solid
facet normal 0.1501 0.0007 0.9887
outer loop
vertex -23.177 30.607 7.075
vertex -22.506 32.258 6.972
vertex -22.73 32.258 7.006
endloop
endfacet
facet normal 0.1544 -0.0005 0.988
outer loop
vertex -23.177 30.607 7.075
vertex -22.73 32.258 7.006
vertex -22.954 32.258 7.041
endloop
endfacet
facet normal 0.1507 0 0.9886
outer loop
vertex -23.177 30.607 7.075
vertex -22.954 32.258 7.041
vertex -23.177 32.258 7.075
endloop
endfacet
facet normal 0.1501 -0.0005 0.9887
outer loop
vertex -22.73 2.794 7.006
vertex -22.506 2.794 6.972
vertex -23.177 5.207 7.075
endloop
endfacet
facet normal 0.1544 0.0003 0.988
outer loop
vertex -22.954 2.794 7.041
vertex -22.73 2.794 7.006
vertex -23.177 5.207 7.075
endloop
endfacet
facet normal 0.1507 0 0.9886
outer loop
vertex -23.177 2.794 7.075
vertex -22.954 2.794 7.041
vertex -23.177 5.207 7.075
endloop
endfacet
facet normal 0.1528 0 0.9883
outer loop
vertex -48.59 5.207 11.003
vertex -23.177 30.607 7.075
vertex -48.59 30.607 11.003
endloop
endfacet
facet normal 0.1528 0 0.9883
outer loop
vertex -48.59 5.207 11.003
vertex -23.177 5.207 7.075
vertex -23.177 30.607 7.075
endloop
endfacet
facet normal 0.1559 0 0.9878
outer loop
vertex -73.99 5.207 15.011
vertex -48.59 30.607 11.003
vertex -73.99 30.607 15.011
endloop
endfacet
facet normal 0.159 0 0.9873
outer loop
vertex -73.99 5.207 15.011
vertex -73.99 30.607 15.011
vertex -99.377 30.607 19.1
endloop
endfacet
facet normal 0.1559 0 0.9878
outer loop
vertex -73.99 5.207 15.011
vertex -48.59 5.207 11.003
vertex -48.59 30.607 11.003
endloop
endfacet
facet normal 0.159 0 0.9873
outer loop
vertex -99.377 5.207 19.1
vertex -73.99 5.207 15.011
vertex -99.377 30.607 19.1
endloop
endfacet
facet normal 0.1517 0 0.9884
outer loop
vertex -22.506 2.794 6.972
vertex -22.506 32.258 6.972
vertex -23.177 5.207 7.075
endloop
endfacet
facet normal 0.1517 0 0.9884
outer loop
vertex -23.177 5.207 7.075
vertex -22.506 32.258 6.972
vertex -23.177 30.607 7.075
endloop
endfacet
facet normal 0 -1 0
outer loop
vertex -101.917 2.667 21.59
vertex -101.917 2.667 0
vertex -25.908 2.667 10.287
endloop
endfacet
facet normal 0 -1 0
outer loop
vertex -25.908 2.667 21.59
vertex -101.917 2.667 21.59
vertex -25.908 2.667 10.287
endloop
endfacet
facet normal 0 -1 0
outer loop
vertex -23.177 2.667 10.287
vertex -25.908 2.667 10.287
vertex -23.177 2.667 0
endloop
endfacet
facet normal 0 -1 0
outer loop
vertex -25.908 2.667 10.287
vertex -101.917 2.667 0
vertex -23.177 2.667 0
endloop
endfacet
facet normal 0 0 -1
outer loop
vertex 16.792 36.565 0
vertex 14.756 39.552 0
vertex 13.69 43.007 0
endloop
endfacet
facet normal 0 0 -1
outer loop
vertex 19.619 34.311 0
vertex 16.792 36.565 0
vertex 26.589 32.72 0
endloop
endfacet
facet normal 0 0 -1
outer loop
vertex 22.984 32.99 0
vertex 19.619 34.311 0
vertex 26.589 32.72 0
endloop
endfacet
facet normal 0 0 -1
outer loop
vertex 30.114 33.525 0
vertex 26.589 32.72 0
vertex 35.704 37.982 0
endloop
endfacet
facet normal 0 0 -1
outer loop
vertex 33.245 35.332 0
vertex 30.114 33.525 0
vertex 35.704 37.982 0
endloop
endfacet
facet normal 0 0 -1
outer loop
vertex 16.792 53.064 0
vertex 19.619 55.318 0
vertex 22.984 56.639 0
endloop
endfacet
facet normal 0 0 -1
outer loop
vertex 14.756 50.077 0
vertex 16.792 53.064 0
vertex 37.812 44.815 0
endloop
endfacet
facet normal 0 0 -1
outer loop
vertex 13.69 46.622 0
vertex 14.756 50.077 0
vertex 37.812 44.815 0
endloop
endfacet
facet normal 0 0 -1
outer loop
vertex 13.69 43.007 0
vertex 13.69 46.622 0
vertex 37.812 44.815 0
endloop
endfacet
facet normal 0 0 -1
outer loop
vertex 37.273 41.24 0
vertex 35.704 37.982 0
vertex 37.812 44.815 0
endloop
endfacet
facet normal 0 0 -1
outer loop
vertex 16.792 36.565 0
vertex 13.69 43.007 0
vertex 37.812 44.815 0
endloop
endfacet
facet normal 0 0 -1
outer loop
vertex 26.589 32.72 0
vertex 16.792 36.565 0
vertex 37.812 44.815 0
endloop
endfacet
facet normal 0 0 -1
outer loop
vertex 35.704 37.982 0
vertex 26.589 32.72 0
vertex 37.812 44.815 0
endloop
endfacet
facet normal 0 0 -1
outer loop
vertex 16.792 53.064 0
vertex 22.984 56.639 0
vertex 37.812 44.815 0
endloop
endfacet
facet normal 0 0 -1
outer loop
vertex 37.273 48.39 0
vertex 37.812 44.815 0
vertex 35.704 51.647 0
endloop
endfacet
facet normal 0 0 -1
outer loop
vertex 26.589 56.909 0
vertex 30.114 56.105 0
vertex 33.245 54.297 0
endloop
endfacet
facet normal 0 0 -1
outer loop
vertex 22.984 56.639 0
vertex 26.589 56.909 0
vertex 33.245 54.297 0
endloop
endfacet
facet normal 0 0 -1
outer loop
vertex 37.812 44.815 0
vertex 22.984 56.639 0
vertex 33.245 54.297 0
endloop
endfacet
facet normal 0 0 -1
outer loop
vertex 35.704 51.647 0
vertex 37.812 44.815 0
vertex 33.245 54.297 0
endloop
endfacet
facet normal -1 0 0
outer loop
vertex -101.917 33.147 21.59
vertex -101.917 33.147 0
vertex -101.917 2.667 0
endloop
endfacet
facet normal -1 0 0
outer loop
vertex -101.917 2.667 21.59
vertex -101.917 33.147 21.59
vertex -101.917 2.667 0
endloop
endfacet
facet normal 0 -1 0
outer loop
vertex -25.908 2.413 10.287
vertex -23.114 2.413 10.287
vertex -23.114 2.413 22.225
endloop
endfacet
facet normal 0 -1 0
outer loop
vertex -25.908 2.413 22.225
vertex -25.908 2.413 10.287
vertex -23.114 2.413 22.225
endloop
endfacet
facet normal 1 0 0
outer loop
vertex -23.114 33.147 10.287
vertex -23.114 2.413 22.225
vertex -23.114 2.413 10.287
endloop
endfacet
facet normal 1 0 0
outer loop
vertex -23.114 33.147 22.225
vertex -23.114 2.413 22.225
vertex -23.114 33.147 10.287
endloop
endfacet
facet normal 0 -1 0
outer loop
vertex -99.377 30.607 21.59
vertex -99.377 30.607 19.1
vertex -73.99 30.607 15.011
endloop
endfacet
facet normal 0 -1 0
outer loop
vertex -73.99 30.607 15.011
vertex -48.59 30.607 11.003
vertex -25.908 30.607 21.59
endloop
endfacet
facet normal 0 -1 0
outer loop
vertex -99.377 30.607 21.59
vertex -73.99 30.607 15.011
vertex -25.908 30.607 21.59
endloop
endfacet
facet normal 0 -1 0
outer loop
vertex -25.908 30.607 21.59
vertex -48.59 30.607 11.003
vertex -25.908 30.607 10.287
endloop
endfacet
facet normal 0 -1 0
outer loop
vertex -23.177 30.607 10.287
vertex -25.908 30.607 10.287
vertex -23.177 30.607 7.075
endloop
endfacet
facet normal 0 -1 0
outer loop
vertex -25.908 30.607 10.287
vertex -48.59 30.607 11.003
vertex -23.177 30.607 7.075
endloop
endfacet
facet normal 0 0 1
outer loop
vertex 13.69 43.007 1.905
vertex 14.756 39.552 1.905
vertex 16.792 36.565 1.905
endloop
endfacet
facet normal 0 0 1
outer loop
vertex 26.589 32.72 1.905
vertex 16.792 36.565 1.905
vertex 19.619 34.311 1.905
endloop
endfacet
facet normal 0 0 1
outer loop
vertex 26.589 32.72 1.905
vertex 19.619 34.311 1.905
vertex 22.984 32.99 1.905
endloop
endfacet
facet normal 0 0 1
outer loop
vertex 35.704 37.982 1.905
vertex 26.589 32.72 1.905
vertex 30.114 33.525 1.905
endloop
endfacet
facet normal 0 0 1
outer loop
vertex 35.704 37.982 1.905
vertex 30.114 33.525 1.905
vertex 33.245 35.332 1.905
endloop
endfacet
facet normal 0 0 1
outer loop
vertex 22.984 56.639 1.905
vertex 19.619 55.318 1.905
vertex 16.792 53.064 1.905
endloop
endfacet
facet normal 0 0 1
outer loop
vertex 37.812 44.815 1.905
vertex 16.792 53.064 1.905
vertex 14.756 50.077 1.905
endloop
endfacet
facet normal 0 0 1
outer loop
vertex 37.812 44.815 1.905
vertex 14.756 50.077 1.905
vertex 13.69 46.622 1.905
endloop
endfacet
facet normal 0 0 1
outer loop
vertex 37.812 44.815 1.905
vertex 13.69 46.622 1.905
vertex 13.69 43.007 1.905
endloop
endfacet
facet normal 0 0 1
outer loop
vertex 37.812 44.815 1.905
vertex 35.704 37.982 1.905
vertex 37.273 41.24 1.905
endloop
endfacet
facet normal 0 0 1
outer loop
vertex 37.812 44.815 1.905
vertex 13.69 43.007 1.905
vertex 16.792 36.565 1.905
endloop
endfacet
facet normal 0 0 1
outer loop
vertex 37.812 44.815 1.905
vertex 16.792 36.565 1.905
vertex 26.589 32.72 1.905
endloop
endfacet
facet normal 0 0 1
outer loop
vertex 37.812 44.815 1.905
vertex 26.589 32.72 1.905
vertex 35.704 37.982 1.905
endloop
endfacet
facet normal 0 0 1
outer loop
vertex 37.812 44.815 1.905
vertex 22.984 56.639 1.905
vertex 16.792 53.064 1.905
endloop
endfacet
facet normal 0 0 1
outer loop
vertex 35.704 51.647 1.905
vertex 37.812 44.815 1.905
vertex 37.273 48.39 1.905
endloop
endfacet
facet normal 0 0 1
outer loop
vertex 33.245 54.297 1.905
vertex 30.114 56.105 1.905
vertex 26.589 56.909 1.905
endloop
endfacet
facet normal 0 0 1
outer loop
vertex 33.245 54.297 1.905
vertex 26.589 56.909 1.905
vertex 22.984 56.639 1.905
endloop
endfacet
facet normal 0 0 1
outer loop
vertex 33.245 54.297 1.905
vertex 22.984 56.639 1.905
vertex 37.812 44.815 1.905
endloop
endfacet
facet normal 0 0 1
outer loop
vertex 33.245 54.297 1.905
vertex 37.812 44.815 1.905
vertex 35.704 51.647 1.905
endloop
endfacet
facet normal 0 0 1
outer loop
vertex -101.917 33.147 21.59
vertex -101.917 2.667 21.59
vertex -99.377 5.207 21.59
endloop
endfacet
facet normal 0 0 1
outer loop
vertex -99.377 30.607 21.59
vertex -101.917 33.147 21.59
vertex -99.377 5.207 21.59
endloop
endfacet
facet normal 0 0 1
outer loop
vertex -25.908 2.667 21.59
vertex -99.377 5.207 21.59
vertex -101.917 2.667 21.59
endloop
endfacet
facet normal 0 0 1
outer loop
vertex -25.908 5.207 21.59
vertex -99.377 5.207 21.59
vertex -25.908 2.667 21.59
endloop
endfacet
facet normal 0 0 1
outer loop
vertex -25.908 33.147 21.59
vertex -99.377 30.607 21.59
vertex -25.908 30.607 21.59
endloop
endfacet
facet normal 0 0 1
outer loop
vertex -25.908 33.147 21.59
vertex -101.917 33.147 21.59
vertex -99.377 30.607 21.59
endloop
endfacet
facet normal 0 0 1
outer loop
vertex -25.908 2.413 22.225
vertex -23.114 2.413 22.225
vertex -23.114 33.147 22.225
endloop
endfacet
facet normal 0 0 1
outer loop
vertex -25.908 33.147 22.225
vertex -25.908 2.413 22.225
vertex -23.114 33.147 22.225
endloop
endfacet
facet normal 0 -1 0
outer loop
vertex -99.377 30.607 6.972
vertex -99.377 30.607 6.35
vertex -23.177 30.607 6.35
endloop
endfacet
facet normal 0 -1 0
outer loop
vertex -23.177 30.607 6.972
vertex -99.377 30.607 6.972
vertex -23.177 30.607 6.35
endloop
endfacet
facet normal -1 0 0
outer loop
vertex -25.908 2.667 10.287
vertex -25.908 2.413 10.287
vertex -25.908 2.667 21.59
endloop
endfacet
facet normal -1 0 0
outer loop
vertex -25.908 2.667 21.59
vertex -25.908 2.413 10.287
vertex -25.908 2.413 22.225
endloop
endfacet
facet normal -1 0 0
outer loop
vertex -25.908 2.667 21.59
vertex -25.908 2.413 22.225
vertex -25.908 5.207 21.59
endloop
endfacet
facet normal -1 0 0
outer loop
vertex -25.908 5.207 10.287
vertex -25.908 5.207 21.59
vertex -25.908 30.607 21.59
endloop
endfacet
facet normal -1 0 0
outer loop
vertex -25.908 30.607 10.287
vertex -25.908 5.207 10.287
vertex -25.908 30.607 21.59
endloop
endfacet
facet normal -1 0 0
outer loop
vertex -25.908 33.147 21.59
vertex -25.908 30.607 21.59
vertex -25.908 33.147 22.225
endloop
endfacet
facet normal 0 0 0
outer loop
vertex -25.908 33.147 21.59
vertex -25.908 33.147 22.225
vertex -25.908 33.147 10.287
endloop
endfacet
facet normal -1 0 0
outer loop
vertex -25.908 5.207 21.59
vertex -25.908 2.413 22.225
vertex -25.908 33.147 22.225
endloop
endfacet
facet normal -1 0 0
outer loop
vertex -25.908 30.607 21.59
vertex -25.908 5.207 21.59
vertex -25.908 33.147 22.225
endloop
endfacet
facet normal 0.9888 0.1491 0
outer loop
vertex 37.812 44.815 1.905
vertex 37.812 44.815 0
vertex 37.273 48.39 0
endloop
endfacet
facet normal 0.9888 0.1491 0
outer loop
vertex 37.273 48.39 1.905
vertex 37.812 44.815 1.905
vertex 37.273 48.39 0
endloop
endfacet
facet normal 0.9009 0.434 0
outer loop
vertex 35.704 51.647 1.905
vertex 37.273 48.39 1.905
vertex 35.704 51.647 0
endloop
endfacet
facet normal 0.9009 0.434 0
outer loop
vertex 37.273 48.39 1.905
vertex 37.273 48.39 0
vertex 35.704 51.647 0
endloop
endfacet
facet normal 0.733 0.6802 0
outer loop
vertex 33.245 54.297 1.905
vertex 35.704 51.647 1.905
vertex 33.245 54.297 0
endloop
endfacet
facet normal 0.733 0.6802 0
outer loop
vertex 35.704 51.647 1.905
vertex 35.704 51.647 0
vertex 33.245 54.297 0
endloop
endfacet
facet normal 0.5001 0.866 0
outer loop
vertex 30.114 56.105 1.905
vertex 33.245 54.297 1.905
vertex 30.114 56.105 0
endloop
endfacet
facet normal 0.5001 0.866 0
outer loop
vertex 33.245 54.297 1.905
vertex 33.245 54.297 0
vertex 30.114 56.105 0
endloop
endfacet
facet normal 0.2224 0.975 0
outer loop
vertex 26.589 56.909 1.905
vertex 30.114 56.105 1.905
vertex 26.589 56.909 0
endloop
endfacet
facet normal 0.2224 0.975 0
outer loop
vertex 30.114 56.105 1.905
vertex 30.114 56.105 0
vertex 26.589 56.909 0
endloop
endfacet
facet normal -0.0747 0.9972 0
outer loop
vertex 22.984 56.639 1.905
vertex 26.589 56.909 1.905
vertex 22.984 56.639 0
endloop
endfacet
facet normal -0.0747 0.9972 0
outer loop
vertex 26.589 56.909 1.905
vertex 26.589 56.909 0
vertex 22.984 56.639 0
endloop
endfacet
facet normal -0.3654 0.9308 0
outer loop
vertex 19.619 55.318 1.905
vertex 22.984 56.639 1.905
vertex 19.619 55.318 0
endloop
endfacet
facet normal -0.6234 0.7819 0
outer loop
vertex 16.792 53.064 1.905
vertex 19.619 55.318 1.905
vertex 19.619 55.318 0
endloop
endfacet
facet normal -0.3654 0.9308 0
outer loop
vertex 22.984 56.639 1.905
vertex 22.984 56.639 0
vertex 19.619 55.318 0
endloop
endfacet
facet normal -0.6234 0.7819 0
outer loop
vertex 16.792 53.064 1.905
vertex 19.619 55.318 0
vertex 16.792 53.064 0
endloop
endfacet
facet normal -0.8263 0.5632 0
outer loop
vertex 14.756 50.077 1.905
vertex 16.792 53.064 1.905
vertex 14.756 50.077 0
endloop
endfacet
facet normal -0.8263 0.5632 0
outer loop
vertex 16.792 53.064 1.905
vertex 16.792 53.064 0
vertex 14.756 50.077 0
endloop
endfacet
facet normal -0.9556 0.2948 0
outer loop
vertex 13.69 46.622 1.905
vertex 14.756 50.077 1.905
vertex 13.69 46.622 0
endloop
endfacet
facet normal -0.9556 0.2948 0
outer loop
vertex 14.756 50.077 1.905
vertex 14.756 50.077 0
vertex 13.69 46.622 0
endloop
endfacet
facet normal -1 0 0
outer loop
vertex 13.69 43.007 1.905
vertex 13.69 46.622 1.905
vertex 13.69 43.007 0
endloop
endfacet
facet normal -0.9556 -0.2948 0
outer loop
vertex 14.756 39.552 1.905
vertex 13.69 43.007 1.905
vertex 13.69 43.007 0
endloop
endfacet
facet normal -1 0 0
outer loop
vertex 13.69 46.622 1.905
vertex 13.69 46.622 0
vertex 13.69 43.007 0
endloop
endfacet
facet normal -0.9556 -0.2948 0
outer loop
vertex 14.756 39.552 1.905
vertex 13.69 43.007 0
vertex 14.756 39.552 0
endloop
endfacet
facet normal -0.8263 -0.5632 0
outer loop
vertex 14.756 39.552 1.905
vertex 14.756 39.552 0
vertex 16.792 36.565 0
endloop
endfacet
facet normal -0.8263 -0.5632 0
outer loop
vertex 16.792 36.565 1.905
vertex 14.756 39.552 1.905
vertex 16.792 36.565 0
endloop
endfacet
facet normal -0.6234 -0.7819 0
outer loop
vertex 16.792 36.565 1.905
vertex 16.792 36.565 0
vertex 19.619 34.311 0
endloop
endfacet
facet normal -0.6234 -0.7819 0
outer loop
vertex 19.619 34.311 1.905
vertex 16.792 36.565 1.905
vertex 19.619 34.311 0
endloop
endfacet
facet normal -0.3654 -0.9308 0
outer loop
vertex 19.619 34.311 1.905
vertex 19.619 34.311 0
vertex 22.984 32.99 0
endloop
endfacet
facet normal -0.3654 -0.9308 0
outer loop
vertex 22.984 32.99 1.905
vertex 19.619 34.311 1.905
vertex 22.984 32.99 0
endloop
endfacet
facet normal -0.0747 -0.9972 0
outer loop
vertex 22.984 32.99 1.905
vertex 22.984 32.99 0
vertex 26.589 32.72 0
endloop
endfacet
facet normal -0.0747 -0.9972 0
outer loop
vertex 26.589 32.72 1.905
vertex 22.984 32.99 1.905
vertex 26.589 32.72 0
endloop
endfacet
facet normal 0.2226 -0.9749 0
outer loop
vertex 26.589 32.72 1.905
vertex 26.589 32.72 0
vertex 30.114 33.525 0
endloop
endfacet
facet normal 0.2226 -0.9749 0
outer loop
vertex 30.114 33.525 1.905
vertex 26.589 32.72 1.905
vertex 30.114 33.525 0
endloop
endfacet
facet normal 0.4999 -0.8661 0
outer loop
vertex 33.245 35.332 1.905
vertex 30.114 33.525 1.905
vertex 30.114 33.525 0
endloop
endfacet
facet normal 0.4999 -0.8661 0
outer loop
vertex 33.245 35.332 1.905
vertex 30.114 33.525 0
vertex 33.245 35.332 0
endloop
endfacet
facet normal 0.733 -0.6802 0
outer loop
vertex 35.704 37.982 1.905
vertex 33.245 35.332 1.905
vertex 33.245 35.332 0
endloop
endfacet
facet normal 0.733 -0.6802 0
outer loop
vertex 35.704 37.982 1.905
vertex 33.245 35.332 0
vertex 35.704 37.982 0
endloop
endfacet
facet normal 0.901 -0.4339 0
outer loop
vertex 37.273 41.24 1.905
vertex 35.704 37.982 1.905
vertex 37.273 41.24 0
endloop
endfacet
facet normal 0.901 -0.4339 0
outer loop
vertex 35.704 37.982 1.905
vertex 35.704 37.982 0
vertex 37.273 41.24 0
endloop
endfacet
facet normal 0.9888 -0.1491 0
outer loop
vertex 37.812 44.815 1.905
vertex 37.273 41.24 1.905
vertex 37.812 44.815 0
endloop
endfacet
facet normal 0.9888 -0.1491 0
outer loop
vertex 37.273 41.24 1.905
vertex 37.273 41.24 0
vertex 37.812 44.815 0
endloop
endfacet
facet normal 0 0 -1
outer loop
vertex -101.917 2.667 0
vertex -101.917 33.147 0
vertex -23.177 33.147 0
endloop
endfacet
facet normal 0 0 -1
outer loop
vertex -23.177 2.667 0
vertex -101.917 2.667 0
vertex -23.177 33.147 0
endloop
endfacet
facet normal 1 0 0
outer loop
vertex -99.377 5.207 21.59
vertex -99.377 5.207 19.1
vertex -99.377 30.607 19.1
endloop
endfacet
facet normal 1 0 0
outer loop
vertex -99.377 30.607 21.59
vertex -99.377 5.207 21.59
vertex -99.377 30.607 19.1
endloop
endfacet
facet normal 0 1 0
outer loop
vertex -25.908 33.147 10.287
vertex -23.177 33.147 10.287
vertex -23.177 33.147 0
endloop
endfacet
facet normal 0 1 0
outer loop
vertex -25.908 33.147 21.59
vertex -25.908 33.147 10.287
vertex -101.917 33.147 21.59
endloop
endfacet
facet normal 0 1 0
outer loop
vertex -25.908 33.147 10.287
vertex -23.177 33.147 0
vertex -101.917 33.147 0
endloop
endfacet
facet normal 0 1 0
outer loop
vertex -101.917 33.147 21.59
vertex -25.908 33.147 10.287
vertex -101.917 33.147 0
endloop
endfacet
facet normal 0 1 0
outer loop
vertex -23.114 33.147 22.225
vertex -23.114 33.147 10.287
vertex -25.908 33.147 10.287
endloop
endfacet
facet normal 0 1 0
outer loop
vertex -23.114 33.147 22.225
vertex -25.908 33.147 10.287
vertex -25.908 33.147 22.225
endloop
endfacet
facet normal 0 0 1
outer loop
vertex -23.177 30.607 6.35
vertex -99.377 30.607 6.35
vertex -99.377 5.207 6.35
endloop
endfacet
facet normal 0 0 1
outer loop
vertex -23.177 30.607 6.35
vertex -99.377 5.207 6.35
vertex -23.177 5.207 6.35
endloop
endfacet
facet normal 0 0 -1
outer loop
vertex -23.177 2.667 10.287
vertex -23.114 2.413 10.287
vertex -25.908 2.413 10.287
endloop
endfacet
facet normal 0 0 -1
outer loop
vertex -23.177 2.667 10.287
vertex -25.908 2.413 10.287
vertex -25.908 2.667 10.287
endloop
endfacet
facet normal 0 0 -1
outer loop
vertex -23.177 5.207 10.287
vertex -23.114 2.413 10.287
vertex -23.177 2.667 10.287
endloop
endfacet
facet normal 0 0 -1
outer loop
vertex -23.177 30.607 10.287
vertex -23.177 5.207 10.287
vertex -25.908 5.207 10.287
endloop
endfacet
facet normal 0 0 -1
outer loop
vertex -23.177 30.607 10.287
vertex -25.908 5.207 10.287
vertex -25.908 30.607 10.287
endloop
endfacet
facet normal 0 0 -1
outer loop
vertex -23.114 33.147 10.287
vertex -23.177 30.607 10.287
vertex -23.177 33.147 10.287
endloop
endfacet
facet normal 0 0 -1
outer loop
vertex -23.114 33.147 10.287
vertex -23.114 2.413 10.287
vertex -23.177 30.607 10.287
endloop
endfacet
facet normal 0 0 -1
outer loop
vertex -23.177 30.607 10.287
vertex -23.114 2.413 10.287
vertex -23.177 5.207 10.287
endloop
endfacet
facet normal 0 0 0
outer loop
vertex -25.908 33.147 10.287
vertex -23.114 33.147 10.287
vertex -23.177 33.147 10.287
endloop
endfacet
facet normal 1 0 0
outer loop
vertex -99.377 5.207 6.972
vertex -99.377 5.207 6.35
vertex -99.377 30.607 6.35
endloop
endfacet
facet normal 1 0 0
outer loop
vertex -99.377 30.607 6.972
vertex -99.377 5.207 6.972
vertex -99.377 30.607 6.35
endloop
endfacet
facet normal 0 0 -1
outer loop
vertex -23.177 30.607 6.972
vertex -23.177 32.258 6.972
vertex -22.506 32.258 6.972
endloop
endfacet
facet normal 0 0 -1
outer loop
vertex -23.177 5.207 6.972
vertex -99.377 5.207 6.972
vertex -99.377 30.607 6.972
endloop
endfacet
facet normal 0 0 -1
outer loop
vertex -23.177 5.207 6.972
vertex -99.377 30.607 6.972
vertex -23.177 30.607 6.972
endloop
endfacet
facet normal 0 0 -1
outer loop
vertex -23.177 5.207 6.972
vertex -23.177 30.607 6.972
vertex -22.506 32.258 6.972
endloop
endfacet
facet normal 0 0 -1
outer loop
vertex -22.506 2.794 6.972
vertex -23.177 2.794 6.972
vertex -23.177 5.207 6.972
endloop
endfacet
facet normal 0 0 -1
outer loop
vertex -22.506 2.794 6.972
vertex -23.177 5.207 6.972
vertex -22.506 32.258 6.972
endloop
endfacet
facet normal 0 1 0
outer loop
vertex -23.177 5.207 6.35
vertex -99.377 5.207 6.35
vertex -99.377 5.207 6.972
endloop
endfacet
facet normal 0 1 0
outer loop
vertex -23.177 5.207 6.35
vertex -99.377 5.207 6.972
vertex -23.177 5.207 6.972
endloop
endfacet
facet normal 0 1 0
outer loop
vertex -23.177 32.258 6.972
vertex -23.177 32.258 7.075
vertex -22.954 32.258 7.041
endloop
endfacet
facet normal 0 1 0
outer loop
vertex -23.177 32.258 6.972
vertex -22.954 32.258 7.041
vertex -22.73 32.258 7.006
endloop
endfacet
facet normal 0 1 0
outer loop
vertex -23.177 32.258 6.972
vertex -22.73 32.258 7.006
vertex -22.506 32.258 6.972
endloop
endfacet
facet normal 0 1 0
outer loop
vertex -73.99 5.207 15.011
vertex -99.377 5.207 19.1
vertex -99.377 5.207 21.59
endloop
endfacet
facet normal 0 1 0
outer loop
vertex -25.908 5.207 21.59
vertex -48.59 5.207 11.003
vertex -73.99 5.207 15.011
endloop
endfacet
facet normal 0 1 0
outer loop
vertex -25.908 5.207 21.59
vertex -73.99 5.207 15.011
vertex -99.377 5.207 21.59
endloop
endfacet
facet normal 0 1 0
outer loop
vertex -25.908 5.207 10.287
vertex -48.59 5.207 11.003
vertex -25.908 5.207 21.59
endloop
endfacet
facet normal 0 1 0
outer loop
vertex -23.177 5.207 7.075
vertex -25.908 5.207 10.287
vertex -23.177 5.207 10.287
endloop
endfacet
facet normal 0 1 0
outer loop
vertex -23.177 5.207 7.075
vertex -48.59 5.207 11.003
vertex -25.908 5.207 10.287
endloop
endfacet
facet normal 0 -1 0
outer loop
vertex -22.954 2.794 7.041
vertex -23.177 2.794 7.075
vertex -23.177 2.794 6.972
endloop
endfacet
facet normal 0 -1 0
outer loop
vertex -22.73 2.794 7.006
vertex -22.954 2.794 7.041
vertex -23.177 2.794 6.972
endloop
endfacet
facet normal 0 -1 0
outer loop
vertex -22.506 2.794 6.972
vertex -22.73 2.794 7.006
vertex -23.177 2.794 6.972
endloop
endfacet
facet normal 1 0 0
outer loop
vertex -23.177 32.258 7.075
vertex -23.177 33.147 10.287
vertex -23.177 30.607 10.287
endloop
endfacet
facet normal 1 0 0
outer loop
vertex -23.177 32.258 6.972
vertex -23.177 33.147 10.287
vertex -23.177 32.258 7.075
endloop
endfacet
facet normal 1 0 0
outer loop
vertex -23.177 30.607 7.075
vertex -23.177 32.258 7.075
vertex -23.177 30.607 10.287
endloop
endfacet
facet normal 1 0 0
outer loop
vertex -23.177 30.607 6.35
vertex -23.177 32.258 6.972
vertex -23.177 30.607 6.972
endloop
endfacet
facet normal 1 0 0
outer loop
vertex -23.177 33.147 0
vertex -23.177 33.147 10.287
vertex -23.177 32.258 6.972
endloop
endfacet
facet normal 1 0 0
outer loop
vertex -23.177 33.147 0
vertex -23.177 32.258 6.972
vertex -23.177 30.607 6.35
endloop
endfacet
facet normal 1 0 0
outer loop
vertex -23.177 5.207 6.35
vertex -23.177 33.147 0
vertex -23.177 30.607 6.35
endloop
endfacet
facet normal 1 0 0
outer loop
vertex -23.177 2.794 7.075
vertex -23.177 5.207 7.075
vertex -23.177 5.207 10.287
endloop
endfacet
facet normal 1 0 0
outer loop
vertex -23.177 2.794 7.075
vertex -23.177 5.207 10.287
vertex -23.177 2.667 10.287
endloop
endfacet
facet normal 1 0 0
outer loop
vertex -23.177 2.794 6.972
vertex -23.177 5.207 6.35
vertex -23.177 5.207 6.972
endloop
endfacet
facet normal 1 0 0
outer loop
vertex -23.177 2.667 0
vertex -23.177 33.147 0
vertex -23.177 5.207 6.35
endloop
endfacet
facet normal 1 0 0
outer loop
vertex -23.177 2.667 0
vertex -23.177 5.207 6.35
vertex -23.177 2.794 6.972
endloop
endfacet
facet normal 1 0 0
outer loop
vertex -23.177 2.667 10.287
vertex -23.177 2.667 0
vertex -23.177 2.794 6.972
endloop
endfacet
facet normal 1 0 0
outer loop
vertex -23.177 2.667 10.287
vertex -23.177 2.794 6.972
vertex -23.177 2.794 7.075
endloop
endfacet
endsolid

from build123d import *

# Parameters (mm, degrees)
F0_W      = 76.2
F0_H      = 25.4
F1_DEPTH  = 6.35
F0_H_2    = 2.5399950532
F0_H_3    = 2.5400049468
F2_DEPTH  = 19.05
F4_DEPTH  = 32.258
F5_DEPTH  = 2.794
F6_DEPTH  = 21.59
F8_START  = -23.114
F7_W      = 30.7340035215
F7_H      = 13.7160019949
F8_DEPTH  = 2.794
F9_R      = 12.1285
F10_DEPTH = 1.905
F11_DEPTH = 1.778


with BuildPart() as f1:
    # F0 (on Top) → F1 (new body)
    with BuildSketch(Plane.XY):
        with Locations((-61.2774978137, 17.9070052312)):
            Rectangle(F0_W, F0_H)
    extrude(amount=F1_DEPTH)



with BuildPart() as f2:
    # F0 (on Top) → F2 (new body)
    with BuildSketch(Plane.XY):
        with Locations((-61.2774978137, 31.8770027578)):
            Rectangle(F0_W, F0_H_2)
        with Locations((-61.2774978137, 3.9370027578)):
            Rectangle(F0_W, F0_H_3)
        Polygon((-99.3774978137, 5.2070052312), (-99.3774978137, 30.6070052312), (-99.3774978137, 33.1470002844), (-101.9174978137, 33.1470002844), (-101.9174978137, 2.6670002844), (-99.3774978137, 2.6670002844), align=None)
    extrude(amount=F2_DEPTH)

    # F3 (on Front) → F4 (join)
    with BuildSketch(Plane.XZ):
        with BuildLine():
            ThreePointArc((-22.5064698607, 6.9721243344), (-61.1948049528, 12.9814471102), (-99.8537540436, 19.1770009696))
            Line((-99.8537540436, 19.1770009696), (-99.8537540436, 6.9721243344))
            Line((-99.8537540436, 6.9721243344), (-22.5064698607, 6.9721243344))
        make_face()
    extrude(amount=-F4_DEPTH)

    # F5 (cut): a face of the model
    f5_faces = [f2.faces().sort_by_distance(p)[0] for p in [
        (-74.2070811501, 0, 11.0193779439),
    ]]
    extrude(f5_faces, amount=-F5_DEPTH, mode=Mode.SUBTRACT)


with BuildPart() as f1_1:
    add(f1.part)

    add(f2.part)  # F6 merges F2
    # F0 (on Top) → F6 (join)
    with BuildSketch(Plane.XY):
        with Locations((-61.2774978137, 3.9370027578)):
            Rectangle(F0_W, F0_H_3)
        Polygon((-99.3774978137, 5.2070052312), (-99.3774978137, 30.6070052312), (-99.3774978137, 33.1470002844), (-101.9174978137, 33.1470002844), (-101.9174978137, 2.6670002844), (-99.3774978137, 2.6670002844), align=None)
        with Locations((-61.2774978137, 31.8770027578)):
            Rectangle(F0_W, F0_H_2)
    extrude(amount=F6_DEPTH)

    # F7 (on Right) → F8 (join)
    with BuildSketch(Plane.YZ.offset(F8_START)):
        with Locations((17.7800017409, 15.3670008294)):
            Rectangle(F7_W, F7_H)
    extrude(amount=-F8_DEPTH)

    # F11 (cut): a face of the model
    f11_faces = [f1_1.faces().sort_by_distance(p)[0] for p in [
        (-24.5048834941, 17.7555399207, 8.508999832),
    ]]
    extrude(f11_faces, amount=-F11_DEPTH, mode=Mode.SUBTRACT)


with BuildPart() as f10:
    # F9 (on Top) → F10 (new body)
    with BuildSketch(Plane.XY):
        with Locations((25.6830565631, 44.8146127164)):
            Circle(F9_R)
    extrude(amount=F10_DEPTH)


solid = Compound([f1_1.part, f10.part])
